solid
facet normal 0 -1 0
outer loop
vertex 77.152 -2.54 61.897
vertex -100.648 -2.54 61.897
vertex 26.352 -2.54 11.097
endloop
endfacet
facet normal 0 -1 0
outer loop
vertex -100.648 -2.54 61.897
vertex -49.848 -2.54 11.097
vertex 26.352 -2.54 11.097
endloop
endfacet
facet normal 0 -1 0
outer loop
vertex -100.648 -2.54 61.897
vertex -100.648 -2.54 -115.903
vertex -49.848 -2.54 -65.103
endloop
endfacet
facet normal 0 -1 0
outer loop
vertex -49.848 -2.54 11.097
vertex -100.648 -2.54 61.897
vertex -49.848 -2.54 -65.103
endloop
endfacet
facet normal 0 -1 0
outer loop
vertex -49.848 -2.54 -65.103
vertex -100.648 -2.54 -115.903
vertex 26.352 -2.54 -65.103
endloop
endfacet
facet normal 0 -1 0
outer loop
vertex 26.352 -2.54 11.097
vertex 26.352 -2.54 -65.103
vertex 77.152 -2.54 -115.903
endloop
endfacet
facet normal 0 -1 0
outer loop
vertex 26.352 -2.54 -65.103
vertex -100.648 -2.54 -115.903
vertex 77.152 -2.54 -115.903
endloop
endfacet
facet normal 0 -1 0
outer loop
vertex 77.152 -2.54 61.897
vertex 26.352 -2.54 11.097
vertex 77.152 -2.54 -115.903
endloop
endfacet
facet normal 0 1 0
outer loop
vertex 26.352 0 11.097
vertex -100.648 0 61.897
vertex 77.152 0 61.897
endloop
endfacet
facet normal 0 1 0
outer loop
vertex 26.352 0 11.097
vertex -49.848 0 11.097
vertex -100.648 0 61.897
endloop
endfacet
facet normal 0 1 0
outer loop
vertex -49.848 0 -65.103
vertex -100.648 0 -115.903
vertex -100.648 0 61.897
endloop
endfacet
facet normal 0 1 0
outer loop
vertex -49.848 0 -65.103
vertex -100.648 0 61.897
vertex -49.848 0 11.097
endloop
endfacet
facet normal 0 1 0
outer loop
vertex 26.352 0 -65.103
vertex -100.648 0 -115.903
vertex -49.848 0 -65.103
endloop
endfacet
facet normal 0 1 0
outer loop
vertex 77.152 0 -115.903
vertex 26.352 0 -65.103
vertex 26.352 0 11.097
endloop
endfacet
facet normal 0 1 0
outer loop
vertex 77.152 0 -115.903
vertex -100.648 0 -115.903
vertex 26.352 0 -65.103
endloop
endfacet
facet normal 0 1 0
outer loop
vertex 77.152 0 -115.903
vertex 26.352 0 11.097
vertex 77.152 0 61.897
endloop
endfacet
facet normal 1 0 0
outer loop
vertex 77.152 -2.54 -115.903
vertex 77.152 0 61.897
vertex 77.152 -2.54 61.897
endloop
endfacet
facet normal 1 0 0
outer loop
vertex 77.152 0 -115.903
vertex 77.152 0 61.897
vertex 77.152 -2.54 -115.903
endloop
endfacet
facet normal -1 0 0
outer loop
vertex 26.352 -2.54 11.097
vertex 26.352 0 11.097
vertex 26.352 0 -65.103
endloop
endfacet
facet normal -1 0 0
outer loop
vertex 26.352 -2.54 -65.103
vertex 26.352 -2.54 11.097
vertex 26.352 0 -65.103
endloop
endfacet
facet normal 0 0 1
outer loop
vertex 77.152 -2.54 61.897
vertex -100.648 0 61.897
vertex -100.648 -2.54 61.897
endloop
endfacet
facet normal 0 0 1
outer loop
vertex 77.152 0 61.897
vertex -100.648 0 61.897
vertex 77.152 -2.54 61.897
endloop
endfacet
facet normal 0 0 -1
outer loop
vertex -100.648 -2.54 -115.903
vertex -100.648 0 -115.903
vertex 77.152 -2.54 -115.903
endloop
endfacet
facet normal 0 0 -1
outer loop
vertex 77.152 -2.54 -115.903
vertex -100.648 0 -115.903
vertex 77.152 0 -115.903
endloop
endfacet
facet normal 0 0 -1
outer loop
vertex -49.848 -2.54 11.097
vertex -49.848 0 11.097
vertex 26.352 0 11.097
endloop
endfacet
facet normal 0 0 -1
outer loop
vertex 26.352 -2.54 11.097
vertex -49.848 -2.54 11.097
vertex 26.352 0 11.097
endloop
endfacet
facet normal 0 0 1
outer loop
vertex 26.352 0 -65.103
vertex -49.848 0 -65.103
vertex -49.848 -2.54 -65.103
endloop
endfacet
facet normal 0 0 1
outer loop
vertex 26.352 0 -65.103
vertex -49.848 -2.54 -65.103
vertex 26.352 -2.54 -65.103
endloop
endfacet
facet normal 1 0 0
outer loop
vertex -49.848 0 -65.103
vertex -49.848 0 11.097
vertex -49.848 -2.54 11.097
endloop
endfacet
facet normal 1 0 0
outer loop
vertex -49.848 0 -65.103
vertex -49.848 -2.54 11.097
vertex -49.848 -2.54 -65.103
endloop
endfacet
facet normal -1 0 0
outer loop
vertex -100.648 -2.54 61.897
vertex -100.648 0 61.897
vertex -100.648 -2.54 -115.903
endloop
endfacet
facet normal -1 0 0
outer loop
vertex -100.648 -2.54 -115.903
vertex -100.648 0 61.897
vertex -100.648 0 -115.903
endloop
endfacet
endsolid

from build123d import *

# Parameters (mm, degrees)
SKETCH4_W           = 177.8
SKETCH4_H           = 177.8
BOSS_EXTRUDE2_DEPTH = 2.54
SKETCH5_W           = 76.2
SKETCH5_H           = 76.2
CUT_EXTRUDE1_DEPTH  = 84.074


with BuildPart() as part:
    # Sketch4 → Boss-Extrude2 (new body)
    with BuildSketch(Plane(origin=(0, 0, 0), x_dir=(1, 0, 0), z_dir=(0, 1, 0))):
        with Locations((-11.748126233, 27.003155819)):
            Rectangle(SKETCH4_W, SKETCH4_H)
    extrude(amount=-BOSS_EXTRUDE2_DEPTH)

    # Sketch5 → Cut-Extrude1 (cut)
    with BuildSketch(Plane(origin=(0, 0, 0), x_dir=(1, 0, 0), z_dir=(0, 1, 0))):
        with Locations((-11.748126233, 27.003155819)):
            Rectangle(SKETCH5_W, SKETCH5_H)
    extrude(amount=-CUT_EXTRUDE1_DEPTH, mode=Mode.SUBTRACT)


solid = part.part
